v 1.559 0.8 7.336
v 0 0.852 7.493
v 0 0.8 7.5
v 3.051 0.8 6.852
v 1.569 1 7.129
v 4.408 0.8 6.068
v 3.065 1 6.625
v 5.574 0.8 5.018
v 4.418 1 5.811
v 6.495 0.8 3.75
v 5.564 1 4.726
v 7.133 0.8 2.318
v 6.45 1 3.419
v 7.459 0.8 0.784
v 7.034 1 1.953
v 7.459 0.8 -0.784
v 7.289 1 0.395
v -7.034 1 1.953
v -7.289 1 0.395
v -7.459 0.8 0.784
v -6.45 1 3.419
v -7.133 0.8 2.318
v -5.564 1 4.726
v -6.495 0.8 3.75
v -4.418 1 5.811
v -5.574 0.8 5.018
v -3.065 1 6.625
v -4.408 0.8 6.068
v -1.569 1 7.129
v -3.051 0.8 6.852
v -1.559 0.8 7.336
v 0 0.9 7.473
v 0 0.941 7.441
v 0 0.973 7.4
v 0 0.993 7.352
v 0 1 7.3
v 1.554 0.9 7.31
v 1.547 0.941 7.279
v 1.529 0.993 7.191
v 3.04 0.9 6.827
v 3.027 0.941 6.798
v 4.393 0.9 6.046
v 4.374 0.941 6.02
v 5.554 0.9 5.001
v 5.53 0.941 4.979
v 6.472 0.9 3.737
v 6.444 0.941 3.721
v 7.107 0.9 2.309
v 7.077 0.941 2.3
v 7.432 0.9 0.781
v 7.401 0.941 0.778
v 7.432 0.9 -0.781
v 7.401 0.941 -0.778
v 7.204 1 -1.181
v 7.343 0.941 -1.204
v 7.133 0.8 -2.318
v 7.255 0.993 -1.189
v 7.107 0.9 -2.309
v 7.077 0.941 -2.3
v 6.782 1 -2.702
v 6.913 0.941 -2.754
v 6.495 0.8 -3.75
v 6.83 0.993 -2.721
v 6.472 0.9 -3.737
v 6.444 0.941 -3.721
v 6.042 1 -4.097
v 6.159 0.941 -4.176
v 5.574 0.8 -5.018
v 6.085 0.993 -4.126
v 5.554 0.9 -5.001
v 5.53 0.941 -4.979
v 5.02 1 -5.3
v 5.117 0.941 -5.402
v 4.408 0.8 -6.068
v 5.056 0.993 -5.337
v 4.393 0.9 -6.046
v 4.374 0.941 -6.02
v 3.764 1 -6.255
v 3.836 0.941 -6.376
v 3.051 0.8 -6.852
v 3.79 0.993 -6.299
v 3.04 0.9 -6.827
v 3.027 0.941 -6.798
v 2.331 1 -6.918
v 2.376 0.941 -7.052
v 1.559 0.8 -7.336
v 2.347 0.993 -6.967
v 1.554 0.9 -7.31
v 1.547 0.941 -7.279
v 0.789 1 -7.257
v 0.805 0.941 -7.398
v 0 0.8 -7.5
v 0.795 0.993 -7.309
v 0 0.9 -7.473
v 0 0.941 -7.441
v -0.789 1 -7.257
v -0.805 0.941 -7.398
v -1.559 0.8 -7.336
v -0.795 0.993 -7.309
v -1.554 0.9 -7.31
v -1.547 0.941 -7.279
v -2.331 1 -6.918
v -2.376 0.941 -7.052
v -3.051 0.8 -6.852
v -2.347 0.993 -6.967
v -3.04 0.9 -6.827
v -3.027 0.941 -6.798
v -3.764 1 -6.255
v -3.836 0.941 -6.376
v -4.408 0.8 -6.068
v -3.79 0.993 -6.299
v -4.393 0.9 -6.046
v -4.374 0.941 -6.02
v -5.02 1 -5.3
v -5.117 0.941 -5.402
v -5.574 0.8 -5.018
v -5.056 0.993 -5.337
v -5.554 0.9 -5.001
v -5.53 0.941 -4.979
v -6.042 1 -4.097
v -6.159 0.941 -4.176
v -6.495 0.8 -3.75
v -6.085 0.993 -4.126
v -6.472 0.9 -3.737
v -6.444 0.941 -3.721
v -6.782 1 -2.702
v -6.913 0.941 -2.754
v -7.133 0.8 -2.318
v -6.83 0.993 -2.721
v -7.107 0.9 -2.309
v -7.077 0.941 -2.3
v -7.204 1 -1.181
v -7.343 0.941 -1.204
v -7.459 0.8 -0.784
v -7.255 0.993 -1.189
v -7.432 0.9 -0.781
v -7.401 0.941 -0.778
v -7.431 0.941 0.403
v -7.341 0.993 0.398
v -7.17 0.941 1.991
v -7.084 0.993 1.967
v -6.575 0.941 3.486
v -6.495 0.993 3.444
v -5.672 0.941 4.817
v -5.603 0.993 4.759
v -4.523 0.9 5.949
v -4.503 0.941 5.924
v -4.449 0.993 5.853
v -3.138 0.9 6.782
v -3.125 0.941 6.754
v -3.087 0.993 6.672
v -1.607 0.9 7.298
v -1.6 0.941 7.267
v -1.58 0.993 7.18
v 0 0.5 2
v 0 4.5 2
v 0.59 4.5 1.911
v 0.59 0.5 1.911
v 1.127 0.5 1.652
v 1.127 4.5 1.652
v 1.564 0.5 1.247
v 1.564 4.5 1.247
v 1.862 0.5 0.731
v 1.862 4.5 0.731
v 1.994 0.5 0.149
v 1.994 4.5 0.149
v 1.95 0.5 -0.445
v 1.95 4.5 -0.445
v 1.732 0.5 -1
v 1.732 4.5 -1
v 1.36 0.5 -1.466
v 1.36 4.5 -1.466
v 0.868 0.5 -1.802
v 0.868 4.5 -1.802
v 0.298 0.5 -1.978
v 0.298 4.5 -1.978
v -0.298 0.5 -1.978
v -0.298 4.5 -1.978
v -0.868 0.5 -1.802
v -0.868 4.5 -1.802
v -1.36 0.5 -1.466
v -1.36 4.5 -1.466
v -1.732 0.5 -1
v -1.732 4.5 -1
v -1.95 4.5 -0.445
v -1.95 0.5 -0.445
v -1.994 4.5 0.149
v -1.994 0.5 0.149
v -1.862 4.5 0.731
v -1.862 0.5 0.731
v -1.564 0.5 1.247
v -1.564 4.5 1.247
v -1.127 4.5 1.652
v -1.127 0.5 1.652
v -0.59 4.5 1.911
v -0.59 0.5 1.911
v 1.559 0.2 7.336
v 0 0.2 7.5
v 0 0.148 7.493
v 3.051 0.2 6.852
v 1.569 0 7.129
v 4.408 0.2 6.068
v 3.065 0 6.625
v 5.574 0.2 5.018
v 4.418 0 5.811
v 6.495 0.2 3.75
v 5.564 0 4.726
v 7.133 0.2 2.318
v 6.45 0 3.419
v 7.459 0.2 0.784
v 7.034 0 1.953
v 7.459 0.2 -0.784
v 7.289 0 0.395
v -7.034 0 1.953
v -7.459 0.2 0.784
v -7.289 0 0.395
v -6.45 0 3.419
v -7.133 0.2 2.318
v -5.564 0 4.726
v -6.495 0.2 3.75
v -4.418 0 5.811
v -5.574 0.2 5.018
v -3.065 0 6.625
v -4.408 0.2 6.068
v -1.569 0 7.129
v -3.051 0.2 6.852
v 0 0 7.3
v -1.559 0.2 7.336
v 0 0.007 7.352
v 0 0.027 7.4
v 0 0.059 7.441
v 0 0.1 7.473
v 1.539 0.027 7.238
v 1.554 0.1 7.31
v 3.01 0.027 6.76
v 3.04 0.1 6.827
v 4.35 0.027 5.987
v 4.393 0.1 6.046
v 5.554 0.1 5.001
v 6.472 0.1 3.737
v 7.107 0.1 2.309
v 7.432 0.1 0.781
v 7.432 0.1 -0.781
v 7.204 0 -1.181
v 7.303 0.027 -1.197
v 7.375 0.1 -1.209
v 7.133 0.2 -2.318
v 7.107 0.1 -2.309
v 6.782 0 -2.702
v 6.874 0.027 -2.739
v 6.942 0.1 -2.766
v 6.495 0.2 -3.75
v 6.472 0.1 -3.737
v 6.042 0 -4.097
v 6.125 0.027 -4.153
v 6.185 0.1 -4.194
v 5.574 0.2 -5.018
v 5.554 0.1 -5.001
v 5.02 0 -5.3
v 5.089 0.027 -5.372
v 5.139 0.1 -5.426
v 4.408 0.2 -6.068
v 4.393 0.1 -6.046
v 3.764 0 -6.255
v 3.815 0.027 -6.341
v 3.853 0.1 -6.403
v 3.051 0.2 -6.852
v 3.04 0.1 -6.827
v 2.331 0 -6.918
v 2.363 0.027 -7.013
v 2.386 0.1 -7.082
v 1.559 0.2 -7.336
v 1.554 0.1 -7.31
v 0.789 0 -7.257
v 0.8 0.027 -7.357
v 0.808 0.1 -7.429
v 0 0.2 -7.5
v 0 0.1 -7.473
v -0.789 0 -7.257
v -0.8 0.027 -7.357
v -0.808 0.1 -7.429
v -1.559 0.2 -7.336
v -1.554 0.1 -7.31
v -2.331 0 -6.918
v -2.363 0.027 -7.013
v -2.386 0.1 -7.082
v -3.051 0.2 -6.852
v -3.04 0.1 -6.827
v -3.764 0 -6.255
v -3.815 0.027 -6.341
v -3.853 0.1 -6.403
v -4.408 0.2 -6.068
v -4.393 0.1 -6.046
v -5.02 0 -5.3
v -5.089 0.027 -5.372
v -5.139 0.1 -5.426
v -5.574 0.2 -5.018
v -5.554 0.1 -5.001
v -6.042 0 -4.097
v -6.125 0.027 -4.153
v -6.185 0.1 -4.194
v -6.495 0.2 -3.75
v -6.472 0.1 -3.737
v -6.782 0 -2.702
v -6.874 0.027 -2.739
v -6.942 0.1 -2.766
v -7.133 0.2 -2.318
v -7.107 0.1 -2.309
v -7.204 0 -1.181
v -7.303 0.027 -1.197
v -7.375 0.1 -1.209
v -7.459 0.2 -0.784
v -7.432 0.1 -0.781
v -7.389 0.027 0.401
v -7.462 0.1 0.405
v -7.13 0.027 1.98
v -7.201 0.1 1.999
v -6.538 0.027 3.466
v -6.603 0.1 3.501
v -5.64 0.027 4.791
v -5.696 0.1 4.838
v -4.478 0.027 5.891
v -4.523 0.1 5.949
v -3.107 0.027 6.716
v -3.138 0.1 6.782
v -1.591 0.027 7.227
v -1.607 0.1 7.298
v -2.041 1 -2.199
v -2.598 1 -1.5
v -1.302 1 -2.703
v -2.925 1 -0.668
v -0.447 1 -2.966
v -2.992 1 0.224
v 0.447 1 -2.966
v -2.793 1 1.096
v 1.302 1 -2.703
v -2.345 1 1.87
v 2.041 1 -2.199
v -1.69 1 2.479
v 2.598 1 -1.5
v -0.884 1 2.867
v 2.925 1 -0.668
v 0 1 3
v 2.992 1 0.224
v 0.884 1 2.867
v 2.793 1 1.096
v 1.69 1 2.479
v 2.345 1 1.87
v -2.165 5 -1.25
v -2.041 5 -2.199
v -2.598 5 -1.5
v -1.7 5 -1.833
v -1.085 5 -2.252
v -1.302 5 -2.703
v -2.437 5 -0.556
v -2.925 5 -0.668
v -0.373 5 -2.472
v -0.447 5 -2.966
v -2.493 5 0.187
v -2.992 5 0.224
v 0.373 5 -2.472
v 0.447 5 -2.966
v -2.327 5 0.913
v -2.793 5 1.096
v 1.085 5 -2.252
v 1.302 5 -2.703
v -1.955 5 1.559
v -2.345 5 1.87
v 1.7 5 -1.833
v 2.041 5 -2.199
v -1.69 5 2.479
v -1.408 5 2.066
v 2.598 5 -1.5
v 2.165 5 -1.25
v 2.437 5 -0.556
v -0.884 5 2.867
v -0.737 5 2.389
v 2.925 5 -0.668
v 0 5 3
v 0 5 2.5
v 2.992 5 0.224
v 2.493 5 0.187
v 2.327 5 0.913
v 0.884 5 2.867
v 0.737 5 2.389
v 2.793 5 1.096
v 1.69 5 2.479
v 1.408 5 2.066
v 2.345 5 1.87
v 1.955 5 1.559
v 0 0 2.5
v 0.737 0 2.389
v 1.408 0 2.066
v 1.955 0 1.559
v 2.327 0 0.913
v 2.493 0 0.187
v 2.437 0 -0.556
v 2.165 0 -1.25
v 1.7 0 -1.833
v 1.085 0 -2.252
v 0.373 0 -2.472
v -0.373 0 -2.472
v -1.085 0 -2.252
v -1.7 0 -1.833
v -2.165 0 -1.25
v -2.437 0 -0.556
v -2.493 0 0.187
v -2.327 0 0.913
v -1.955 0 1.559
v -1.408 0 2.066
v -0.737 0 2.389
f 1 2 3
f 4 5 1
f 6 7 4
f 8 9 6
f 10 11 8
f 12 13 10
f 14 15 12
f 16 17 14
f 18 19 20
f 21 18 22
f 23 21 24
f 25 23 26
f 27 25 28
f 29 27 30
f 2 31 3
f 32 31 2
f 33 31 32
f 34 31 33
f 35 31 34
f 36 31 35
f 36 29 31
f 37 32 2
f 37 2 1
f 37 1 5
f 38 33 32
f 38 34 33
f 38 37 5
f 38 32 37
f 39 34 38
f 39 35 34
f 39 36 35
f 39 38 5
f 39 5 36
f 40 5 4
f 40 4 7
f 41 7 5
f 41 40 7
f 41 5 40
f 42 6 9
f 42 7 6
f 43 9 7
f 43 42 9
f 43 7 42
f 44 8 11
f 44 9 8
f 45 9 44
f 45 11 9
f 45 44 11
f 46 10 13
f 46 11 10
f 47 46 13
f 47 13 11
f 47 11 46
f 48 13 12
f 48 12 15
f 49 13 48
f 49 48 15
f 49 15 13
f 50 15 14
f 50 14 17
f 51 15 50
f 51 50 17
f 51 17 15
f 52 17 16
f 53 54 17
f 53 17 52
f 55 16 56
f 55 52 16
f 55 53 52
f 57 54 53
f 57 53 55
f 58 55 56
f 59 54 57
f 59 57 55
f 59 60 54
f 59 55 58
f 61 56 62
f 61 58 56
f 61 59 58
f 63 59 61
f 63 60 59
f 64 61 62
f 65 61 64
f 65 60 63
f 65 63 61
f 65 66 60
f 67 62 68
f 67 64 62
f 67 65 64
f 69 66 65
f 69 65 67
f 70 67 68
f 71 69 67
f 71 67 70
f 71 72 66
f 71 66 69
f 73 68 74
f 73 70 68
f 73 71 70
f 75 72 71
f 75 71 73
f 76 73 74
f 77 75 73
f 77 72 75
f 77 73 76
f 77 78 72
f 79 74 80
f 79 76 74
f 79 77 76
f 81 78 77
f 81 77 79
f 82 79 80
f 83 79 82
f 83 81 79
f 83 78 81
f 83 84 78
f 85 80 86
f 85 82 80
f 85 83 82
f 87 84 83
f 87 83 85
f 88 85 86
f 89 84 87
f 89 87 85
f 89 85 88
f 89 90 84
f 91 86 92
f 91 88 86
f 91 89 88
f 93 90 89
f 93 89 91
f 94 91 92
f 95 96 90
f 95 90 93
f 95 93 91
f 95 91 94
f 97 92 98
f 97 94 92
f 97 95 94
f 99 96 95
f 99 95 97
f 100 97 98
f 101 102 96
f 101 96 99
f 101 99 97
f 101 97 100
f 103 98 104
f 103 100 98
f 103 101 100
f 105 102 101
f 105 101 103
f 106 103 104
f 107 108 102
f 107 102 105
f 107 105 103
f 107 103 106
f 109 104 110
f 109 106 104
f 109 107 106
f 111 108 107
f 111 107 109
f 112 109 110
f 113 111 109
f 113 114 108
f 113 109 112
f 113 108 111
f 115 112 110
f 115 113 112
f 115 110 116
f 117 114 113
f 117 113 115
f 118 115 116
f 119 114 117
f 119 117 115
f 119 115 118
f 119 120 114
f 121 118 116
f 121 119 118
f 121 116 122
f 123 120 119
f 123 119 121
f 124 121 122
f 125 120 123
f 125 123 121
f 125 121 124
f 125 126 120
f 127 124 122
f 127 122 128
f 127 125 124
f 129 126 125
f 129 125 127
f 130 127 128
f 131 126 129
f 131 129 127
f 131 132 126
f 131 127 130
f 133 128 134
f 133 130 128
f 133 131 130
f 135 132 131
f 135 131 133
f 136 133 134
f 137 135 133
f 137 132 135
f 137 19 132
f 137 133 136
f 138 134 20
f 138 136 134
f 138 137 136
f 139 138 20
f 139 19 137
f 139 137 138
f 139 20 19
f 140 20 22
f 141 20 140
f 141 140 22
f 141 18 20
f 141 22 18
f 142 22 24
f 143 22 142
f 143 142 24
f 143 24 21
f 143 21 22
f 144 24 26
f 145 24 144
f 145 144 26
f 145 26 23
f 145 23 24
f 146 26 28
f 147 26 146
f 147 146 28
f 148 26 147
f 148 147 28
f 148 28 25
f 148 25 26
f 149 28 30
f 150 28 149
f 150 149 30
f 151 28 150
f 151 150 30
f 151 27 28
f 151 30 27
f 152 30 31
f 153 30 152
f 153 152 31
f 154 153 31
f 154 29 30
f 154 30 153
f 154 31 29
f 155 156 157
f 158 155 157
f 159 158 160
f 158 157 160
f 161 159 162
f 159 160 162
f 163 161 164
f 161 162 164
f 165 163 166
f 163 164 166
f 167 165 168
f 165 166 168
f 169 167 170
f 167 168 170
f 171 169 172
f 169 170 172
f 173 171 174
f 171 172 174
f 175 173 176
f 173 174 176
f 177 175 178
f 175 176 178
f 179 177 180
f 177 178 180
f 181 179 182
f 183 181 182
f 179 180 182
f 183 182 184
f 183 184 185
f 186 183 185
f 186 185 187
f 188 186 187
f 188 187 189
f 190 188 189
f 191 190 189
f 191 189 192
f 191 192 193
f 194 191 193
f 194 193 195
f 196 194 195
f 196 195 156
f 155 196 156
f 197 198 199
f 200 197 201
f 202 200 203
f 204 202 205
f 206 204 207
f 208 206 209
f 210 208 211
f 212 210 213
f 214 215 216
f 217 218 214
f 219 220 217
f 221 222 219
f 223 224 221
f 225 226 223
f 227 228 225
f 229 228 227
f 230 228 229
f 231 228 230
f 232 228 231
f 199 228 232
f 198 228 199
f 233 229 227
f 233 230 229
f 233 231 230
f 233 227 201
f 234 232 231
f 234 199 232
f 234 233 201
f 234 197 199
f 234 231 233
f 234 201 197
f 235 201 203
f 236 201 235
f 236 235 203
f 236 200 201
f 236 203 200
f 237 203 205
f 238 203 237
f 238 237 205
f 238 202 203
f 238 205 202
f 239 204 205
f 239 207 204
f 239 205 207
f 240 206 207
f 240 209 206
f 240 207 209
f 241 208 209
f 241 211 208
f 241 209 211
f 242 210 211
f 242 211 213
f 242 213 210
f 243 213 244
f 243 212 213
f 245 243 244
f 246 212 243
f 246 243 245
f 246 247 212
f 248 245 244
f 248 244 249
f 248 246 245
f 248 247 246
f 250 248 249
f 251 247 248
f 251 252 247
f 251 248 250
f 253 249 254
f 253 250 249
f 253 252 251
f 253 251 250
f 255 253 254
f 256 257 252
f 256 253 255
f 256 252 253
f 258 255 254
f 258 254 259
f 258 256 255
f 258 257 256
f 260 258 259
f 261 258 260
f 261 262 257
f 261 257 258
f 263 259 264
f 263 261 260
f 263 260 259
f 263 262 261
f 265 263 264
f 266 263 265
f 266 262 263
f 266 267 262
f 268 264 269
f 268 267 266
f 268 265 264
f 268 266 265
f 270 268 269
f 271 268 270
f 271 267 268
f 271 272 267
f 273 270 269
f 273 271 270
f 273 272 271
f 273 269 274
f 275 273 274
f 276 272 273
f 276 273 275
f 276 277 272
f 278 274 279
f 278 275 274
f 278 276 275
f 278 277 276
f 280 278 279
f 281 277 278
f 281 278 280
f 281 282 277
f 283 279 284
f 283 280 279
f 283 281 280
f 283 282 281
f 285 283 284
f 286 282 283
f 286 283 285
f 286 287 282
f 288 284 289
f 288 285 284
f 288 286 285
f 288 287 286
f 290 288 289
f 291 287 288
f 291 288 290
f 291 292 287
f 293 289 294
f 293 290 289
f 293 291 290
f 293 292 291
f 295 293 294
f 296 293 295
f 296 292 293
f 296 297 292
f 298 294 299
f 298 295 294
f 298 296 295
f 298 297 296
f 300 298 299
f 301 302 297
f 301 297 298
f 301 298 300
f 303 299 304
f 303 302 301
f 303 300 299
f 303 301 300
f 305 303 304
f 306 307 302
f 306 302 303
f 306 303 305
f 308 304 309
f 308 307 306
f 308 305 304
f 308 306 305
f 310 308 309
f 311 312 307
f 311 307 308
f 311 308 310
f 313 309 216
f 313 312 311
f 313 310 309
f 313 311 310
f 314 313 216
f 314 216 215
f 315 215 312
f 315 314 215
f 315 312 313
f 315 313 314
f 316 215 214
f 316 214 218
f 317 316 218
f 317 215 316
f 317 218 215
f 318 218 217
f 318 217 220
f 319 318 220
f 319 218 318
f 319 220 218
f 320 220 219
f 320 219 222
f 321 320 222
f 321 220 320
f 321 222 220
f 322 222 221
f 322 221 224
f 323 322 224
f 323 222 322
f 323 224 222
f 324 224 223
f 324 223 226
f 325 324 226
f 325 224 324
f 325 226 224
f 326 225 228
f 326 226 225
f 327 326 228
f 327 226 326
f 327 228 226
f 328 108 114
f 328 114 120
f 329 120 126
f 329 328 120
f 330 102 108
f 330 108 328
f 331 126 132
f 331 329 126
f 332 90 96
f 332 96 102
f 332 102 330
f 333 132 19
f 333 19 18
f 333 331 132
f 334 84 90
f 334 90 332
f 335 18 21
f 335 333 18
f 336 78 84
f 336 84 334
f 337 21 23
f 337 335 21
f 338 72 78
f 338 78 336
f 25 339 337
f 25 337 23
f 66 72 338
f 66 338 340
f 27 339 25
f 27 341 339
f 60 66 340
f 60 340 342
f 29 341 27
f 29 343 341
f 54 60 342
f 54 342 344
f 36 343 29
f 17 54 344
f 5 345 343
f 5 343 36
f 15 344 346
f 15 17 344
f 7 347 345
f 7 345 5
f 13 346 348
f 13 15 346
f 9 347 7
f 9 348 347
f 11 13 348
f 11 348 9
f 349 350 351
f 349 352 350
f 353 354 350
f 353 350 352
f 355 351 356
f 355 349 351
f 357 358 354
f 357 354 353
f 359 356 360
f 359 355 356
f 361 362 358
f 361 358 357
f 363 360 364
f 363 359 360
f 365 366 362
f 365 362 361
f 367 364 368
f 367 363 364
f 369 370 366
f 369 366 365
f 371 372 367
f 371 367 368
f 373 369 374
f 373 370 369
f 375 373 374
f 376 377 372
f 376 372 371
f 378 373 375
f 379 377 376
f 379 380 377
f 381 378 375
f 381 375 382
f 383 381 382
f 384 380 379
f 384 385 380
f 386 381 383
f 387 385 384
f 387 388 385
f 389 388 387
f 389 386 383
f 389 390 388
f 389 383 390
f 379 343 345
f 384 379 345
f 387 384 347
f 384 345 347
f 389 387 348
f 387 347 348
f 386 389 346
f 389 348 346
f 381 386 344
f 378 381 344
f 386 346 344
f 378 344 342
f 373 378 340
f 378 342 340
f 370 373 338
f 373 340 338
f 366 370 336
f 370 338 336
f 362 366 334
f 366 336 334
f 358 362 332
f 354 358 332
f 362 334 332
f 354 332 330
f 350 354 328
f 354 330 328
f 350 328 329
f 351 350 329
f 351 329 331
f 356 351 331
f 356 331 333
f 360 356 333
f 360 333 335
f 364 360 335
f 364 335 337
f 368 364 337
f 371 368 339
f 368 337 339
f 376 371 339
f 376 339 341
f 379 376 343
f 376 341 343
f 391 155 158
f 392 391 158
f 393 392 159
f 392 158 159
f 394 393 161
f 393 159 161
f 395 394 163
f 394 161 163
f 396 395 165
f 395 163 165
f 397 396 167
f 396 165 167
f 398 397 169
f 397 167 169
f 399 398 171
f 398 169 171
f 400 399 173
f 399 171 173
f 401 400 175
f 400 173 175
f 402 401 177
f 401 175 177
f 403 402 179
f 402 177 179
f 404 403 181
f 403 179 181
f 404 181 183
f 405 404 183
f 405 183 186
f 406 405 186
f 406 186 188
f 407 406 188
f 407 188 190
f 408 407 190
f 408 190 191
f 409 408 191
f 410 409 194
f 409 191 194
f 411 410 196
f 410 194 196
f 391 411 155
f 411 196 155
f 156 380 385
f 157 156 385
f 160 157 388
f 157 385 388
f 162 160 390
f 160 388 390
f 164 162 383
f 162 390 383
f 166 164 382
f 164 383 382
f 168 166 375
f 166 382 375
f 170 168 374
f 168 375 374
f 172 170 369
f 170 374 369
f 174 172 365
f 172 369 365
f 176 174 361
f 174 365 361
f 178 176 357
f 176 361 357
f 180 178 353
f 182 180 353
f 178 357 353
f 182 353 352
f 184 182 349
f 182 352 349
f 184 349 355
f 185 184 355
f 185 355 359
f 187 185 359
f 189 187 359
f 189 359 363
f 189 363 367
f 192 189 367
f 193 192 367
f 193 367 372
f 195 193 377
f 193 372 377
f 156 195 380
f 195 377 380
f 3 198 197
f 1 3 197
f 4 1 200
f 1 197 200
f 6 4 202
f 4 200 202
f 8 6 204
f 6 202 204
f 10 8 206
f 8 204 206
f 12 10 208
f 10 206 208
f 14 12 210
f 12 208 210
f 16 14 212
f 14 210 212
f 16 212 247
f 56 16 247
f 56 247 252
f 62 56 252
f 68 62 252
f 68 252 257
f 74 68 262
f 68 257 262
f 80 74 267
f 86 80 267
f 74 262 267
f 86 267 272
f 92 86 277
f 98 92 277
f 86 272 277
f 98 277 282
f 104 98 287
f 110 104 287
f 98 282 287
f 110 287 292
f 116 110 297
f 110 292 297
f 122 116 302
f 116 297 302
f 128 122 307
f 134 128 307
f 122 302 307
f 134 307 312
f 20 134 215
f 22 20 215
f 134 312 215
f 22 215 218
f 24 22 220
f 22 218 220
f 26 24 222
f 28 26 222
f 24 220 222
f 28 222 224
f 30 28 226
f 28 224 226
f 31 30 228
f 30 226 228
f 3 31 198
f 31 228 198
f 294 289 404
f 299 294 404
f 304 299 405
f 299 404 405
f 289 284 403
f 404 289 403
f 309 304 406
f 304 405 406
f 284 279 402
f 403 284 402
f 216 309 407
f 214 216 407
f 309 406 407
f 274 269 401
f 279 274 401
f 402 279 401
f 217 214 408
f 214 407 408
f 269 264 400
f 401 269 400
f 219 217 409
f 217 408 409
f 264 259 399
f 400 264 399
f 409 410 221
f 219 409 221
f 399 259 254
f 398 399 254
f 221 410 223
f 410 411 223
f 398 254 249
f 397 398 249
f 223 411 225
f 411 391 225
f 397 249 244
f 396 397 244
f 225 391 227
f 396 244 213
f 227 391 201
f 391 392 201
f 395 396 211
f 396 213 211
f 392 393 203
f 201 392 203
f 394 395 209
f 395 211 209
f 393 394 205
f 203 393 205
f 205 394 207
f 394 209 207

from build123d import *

# Parameters (mm, degrees)
SKETCH_1_R          = 7.5
EXTRUDE_1_DEPTH     = 1
SKETCH_2_R          = 3
EXTRUDE_2_DEPTH     = 4
CUT_EXTRUDE_1_REACH = 13.726
SKETCH_3_R          = 2
CHAMFER_1_SIZE      = 0.5
FILLET_1_R          = 0.2


with BuildPart() as part:
    # 草图1 → 凸台-拉伸1 (new body)
    with BuildSketch(Plane(origin=(0, 0, 0), x_dir=(1, 0, 0), z_dir=(0, 1, 0))):
        with Locations(Location((0, 0, 0), (0, 0, 270))):
            Circle(SKETCH_1_R)
    extrude(amount=EXTRUDE_1_DEPTH)

    # 草图2 → 凸台-拉伸2 (add)
    with BuildSketch(Plane(origin=(0, 1, 0), x_dir=(1, 0, 0), z_dir=(0, 1, 0))):
        with Locations(Location((0, 0, 0), (0, 0, 270))):
            Circle(SKETCH_2_R)
    extrude(amount=EXTRUDE_2_DEPTH)

    # 草图3 → 切除-拉伸1 (cut, up to next)
    with BuildSketch(Plane(origin=(0, 5, 0), x_dir=(1, 0, 0), z_dir=(0, 1, 0)), mode=Mode.PRIVATE) as cut_extrude_1_sk1:
        with Locations(Location((0, 0, 0), (0, 0, 270))):
            Circle(SKETCH_3_R)
    cut_extrude_1_tool1 = extrude(cut_extrude_1_sk1.sketch, amount=-CUT_EXTRUDE_1_REACH, mode=Mode.PRIVATE) & part.part
    add(cut_extrude_1_tool1.solids().sort_by_distance((0, 5, 0))[0], mode=Mode.SUBTRACT)

    # 倒角1
    chamfer_1_edges = [part.edges().sort_by_distance(p)[0] for p in [
        (0, 5, -2),
        (0, 0, -2),
    ]]
    chamfer(chamfer_1_edges, length=CHAMFER_1_SIZE)

    # 圆角1
    fillet_1_edges = [part.edges().sort_by_distance(p)[0] for p in [
        (0, 0, -7.5),
        (0, 1, -7.5),
    ]]
    fillet(fillet_1_edges, radius=FILLET_1_R)


solid = part.part
